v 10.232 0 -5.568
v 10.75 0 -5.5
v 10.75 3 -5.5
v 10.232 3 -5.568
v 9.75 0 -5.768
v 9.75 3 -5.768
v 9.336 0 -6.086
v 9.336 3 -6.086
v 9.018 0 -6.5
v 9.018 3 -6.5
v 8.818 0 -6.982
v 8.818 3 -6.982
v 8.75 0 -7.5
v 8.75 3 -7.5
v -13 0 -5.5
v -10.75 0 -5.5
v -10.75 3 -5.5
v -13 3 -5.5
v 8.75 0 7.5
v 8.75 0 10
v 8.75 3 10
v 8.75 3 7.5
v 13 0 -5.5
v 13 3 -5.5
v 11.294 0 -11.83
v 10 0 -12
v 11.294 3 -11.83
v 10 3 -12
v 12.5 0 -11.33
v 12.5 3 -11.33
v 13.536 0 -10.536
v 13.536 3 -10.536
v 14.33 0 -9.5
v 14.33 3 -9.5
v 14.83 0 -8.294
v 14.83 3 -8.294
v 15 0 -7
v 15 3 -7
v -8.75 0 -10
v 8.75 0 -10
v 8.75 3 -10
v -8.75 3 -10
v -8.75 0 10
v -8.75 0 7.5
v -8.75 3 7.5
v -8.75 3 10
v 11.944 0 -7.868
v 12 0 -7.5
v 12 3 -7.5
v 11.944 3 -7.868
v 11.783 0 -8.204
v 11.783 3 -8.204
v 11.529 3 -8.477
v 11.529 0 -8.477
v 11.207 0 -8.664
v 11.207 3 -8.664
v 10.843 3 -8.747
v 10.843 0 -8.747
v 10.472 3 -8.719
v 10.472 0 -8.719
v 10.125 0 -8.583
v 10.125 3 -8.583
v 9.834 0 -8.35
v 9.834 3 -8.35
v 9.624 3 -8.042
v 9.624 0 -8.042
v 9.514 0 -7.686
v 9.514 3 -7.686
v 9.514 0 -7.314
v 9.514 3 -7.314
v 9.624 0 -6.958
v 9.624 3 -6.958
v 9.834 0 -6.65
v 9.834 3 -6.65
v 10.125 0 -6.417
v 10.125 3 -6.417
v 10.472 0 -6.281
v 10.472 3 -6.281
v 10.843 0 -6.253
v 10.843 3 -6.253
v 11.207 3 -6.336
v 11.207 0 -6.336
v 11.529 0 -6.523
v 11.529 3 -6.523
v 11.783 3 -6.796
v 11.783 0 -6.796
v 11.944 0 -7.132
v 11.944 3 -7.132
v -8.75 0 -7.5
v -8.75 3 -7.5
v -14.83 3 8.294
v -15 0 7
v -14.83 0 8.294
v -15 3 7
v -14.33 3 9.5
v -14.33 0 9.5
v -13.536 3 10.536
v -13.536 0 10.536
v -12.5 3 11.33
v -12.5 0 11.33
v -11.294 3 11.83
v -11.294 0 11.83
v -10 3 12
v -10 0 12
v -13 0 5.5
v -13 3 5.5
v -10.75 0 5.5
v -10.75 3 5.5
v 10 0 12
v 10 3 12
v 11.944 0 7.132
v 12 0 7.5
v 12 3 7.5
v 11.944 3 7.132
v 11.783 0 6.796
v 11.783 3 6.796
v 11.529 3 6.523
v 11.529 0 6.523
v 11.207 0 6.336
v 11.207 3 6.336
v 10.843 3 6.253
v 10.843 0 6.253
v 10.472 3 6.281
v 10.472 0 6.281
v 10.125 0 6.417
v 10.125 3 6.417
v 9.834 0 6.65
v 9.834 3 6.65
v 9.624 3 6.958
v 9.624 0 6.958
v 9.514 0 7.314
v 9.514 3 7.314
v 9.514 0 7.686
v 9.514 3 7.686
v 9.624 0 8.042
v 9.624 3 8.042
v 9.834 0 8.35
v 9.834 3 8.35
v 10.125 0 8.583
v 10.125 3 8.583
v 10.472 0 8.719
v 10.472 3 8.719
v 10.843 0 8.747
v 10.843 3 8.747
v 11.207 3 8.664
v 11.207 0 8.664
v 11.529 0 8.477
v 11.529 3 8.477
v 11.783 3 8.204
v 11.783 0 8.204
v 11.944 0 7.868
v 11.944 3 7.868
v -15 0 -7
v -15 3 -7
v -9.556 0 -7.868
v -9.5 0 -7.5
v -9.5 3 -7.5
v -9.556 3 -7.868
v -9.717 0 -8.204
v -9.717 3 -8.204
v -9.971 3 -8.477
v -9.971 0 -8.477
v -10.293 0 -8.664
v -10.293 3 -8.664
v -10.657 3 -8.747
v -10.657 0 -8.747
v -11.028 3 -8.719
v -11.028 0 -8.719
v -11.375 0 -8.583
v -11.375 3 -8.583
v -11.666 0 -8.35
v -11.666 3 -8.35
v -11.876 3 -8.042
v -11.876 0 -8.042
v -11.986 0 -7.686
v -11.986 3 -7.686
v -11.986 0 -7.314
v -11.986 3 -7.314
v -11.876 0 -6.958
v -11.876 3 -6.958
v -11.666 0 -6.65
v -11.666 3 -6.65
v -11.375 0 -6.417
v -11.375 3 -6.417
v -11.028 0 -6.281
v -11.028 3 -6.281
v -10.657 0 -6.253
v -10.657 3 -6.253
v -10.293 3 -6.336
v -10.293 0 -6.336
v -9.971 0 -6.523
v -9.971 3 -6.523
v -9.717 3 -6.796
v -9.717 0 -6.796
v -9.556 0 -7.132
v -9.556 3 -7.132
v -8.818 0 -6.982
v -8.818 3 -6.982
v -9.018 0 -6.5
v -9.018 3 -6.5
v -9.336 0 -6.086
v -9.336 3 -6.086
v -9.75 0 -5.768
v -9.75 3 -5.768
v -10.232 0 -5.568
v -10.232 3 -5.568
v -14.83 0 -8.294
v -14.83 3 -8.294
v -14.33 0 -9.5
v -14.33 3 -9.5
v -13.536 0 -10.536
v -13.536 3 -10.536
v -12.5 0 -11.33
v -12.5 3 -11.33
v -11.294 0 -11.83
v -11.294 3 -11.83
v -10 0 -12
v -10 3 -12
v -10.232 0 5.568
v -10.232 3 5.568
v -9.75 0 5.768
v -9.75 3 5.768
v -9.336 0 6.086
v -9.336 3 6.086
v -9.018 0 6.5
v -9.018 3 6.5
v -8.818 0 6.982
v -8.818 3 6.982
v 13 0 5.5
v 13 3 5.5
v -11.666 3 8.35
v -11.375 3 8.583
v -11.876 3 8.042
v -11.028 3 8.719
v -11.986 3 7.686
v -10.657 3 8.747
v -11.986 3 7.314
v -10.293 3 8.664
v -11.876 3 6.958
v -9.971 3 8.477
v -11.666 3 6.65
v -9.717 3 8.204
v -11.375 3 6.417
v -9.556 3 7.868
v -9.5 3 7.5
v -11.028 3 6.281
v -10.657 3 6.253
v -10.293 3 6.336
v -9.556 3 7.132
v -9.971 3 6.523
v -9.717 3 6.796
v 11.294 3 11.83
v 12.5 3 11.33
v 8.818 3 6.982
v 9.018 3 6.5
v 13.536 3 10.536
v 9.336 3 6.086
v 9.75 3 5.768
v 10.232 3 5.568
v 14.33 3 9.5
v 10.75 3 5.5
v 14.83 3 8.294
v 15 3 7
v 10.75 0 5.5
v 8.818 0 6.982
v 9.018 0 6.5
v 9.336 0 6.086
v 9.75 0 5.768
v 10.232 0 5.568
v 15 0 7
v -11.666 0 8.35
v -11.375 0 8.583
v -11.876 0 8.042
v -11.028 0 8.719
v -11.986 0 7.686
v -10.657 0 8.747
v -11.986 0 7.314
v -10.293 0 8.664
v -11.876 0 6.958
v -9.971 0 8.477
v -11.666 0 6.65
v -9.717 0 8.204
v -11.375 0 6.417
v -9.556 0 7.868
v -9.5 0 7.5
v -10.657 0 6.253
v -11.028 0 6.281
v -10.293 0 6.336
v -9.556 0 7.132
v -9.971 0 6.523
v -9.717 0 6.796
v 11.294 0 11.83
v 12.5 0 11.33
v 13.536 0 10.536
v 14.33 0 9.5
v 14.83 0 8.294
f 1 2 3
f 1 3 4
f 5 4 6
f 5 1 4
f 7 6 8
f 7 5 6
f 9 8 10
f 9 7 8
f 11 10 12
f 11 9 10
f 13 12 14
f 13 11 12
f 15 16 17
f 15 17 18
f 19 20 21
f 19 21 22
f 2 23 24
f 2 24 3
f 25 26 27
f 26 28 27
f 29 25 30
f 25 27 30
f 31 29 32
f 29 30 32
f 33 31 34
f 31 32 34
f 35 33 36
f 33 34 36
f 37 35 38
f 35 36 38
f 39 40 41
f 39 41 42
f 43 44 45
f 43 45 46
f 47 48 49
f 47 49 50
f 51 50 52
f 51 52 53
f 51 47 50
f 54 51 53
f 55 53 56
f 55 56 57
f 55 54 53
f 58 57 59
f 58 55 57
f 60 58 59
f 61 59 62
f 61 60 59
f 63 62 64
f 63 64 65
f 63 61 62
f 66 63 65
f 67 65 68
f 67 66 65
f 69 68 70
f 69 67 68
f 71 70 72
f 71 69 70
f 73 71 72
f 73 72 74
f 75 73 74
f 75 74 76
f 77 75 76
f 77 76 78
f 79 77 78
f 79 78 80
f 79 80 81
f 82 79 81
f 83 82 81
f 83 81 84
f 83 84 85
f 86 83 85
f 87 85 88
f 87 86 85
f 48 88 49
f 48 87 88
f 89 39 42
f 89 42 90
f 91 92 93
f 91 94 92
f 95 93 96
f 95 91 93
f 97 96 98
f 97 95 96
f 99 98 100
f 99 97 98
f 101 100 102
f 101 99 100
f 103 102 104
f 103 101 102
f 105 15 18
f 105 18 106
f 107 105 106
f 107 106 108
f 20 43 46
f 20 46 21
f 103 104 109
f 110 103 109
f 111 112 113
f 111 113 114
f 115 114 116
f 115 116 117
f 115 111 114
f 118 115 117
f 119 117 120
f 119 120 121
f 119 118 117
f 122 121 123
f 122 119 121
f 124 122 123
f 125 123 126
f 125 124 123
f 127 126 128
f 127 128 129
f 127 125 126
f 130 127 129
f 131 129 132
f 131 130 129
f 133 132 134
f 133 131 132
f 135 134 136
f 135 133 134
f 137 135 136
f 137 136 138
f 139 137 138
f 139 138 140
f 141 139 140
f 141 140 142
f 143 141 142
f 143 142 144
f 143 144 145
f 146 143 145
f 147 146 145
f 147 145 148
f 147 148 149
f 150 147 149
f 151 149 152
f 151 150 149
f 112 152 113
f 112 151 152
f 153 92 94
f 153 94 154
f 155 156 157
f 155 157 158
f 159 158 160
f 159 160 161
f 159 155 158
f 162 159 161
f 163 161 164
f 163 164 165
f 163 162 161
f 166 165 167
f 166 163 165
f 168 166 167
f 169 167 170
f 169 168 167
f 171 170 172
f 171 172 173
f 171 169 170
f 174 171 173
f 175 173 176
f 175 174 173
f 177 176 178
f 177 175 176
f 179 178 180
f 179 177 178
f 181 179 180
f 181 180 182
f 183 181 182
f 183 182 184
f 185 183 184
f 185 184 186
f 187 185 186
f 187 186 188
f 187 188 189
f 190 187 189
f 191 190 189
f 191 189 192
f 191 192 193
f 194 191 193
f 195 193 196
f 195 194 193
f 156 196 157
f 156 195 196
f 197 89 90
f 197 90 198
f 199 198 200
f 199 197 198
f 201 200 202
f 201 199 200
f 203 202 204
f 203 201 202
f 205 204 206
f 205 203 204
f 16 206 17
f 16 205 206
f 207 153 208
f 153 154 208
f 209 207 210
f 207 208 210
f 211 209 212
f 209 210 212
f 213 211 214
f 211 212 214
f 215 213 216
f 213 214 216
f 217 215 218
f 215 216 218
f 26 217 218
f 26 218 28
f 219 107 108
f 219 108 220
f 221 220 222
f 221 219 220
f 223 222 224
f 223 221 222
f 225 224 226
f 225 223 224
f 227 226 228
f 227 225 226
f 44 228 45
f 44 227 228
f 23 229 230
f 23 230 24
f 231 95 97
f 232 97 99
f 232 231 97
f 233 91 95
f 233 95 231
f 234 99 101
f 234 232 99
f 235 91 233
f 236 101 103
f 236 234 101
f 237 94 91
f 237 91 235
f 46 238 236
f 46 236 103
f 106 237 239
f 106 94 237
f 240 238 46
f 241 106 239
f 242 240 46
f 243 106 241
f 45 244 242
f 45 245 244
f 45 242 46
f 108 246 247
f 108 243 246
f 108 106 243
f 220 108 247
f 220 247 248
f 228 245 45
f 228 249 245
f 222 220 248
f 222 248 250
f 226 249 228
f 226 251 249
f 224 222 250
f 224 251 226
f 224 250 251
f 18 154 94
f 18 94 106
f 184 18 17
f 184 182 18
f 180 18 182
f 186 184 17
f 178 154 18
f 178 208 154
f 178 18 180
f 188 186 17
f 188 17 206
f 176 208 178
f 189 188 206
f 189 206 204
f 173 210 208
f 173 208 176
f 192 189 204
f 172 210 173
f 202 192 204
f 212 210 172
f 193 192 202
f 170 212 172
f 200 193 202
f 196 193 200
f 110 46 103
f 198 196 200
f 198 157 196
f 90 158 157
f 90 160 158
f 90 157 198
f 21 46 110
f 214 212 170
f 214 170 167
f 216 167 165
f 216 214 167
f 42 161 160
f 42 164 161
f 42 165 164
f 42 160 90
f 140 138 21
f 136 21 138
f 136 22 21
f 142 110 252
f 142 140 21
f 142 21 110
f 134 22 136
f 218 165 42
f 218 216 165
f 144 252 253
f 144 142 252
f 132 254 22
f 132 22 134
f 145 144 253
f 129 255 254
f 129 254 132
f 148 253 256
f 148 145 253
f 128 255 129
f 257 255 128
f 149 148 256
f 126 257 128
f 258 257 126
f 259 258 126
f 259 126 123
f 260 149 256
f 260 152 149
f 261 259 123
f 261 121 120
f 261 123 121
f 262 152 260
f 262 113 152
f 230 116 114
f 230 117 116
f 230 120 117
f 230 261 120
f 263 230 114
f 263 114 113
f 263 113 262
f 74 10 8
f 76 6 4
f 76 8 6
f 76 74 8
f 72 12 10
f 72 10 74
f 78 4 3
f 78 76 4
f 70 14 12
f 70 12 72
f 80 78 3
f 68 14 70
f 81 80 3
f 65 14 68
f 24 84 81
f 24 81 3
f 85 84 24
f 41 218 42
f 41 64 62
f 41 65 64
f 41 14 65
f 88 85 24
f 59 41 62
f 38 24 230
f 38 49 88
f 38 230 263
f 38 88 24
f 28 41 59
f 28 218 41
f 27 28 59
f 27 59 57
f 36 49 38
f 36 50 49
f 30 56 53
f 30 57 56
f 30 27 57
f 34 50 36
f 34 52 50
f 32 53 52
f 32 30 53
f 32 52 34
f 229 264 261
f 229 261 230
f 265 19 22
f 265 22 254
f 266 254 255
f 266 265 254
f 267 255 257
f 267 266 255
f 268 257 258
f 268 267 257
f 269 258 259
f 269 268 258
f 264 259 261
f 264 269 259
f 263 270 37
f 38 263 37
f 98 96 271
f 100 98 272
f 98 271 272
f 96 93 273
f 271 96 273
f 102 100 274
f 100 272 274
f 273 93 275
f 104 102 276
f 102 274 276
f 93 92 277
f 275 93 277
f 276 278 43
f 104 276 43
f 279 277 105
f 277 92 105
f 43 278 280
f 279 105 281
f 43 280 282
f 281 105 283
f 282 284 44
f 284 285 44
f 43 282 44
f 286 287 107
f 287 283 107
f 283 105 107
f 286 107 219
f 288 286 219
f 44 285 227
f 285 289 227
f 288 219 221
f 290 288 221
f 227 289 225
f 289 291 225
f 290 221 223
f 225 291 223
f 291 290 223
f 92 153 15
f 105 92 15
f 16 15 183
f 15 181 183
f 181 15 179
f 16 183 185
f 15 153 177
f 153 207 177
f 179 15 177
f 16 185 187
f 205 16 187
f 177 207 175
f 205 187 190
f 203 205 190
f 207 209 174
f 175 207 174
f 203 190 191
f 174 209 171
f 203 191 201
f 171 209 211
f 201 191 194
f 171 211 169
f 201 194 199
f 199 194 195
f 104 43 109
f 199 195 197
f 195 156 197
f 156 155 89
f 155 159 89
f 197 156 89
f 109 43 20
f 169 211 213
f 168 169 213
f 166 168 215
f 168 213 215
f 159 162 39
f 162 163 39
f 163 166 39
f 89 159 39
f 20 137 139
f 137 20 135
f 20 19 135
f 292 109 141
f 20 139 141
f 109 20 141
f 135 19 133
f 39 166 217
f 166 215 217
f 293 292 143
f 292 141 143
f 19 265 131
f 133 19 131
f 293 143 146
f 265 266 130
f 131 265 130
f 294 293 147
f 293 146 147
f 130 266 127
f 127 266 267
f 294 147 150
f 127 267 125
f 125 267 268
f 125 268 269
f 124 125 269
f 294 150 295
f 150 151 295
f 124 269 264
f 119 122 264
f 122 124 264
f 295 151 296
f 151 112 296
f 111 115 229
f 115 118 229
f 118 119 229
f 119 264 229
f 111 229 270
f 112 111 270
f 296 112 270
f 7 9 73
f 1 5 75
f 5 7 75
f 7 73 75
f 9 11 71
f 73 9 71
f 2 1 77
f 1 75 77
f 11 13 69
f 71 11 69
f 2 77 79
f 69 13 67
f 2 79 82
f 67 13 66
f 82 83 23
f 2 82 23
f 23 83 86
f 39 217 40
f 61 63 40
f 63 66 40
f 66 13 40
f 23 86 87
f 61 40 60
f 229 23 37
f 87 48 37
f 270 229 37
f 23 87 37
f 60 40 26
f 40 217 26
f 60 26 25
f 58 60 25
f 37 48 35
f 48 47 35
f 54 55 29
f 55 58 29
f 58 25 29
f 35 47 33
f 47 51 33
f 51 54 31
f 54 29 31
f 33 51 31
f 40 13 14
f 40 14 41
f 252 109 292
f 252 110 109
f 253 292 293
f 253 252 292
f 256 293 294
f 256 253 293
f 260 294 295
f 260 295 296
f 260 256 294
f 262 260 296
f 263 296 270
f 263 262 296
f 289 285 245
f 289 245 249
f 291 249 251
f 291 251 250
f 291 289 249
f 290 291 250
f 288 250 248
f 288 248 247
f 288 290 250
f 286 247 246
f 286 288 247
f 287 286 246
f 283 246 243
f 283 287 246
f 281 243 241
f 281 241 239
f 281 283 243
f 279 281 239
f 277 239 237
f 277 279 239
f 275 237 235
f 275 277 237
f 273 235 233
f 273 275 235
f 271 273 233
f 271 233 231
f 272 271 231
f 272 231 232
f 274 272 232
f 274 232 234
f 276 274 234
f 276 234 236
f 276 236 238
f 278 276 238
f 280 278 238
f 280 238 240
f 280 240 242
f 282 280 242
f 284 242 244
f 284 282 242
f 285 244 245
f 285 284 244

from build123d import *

# Parameters (mm, degrees)
SKETCH1_W           = 30
SKETCH1_H           = 24
BOSS_EXTRUDE1_DEPTH = 3
SKETCH2_R           = 1.25
CUT_EXTRUDE1_DEPTH  = 3
CUT_EXTRUDE2_DEPTH  = 3
FILLET1_R           = 5


with BuildPart() as part:
    # Sketch1 → Boss-Extrude1 (new body)
    with BuildSketch(Plane(origin=(0, 0, 0), x_dir=(1, 0, 0), z_dir=(0, 1, 0))):
        Rectangle(SKETCH1_W, SKETCH1_H)
    extrude(amount=BOSS_EXTRUDE1_DEPTH)

    # Sketch2 → Cut-Extrude1 (cut)
    with BuildSketch(Plane(origin=(0, 0, 0), x_dir=(1, 0, 0), z_dir=(0, 1, 0))):
        with Locations((-10.75, 7.5)):
            Circle(SKETCH2_R)
        with Locations((-10.75, -7.5)):
            Circle(SKETCH2_R)
        with Locations((10.75, -7.5)):
            Circle(SKETCH2_R)
        with Locations((10.75, 7.5)):
            Circle(SKETCH2_R)
    extrude(amount=CUT_EXTRUDE1_DEPTH, mode=Mode.SUBTRACT)

    # Sketch4 → Cut-Extrude2 (cut)
    with BuildSketch(Plane(origin=(0, 0, 0), x_dir=(1, 0, 0), z_dir=(0, 1, 0))):
        with BuildLine():
            Line((-10.75, 5.5), (-13, 5.5))
            Line((-13, 5.5), (-13, -5.5))
            Line((-13, -5.5), (-10.75, -5.5))
            ThreePointArc((-10.75, -5.5), (-9.335786438, -6.085786438), (-8.75, -7.5))
            Line((-8.75, -7.5), (-8.75, -10))
            Line((-8.75, -10), (8.75, -10))
            Line((8.75, -10), (8.75, -7.5))
            ThreePointArc((8.75, -7.5), (9.335786438, -6.085786438), (10.75, -5.5))
            Line((10.75, -5.5), (13, -5.5))
            Line((13, -5.5), (13, 5.5))
            Line((13, 5.5), (10.75, 5.5))
            ThreePointArc((10.75, 5.5), (9.335786438, 6.085786438), (8.75, 7.5))
            Line((8.75, 7.5), (8.75, 10))
            Line((8.75, 10), (-8.75, 10))
            Line((-8.75, 10), (-8.75, 7.5))
            ThreePointArc((-8.75, 7.5), (-9.335786438, 6.085786438), (-10.75, 5.5))
        make_face()
    extrude(amount=CUT_EXTRUDE2_DEPTH, mode=Mode.SUBTRACT)

    # Fillet1
    fillet1_edges = [part.edges().sort_by_distance(p)[0] for p in [
        (15, 1.5, 12),
        (-15, 1.5, 12),
        (-15, 1.5, -12),
        (15, 1.5, -12),
    ]]
    fillet(fillet1_edges, radius=FILLET1_R)


solid = part.part
